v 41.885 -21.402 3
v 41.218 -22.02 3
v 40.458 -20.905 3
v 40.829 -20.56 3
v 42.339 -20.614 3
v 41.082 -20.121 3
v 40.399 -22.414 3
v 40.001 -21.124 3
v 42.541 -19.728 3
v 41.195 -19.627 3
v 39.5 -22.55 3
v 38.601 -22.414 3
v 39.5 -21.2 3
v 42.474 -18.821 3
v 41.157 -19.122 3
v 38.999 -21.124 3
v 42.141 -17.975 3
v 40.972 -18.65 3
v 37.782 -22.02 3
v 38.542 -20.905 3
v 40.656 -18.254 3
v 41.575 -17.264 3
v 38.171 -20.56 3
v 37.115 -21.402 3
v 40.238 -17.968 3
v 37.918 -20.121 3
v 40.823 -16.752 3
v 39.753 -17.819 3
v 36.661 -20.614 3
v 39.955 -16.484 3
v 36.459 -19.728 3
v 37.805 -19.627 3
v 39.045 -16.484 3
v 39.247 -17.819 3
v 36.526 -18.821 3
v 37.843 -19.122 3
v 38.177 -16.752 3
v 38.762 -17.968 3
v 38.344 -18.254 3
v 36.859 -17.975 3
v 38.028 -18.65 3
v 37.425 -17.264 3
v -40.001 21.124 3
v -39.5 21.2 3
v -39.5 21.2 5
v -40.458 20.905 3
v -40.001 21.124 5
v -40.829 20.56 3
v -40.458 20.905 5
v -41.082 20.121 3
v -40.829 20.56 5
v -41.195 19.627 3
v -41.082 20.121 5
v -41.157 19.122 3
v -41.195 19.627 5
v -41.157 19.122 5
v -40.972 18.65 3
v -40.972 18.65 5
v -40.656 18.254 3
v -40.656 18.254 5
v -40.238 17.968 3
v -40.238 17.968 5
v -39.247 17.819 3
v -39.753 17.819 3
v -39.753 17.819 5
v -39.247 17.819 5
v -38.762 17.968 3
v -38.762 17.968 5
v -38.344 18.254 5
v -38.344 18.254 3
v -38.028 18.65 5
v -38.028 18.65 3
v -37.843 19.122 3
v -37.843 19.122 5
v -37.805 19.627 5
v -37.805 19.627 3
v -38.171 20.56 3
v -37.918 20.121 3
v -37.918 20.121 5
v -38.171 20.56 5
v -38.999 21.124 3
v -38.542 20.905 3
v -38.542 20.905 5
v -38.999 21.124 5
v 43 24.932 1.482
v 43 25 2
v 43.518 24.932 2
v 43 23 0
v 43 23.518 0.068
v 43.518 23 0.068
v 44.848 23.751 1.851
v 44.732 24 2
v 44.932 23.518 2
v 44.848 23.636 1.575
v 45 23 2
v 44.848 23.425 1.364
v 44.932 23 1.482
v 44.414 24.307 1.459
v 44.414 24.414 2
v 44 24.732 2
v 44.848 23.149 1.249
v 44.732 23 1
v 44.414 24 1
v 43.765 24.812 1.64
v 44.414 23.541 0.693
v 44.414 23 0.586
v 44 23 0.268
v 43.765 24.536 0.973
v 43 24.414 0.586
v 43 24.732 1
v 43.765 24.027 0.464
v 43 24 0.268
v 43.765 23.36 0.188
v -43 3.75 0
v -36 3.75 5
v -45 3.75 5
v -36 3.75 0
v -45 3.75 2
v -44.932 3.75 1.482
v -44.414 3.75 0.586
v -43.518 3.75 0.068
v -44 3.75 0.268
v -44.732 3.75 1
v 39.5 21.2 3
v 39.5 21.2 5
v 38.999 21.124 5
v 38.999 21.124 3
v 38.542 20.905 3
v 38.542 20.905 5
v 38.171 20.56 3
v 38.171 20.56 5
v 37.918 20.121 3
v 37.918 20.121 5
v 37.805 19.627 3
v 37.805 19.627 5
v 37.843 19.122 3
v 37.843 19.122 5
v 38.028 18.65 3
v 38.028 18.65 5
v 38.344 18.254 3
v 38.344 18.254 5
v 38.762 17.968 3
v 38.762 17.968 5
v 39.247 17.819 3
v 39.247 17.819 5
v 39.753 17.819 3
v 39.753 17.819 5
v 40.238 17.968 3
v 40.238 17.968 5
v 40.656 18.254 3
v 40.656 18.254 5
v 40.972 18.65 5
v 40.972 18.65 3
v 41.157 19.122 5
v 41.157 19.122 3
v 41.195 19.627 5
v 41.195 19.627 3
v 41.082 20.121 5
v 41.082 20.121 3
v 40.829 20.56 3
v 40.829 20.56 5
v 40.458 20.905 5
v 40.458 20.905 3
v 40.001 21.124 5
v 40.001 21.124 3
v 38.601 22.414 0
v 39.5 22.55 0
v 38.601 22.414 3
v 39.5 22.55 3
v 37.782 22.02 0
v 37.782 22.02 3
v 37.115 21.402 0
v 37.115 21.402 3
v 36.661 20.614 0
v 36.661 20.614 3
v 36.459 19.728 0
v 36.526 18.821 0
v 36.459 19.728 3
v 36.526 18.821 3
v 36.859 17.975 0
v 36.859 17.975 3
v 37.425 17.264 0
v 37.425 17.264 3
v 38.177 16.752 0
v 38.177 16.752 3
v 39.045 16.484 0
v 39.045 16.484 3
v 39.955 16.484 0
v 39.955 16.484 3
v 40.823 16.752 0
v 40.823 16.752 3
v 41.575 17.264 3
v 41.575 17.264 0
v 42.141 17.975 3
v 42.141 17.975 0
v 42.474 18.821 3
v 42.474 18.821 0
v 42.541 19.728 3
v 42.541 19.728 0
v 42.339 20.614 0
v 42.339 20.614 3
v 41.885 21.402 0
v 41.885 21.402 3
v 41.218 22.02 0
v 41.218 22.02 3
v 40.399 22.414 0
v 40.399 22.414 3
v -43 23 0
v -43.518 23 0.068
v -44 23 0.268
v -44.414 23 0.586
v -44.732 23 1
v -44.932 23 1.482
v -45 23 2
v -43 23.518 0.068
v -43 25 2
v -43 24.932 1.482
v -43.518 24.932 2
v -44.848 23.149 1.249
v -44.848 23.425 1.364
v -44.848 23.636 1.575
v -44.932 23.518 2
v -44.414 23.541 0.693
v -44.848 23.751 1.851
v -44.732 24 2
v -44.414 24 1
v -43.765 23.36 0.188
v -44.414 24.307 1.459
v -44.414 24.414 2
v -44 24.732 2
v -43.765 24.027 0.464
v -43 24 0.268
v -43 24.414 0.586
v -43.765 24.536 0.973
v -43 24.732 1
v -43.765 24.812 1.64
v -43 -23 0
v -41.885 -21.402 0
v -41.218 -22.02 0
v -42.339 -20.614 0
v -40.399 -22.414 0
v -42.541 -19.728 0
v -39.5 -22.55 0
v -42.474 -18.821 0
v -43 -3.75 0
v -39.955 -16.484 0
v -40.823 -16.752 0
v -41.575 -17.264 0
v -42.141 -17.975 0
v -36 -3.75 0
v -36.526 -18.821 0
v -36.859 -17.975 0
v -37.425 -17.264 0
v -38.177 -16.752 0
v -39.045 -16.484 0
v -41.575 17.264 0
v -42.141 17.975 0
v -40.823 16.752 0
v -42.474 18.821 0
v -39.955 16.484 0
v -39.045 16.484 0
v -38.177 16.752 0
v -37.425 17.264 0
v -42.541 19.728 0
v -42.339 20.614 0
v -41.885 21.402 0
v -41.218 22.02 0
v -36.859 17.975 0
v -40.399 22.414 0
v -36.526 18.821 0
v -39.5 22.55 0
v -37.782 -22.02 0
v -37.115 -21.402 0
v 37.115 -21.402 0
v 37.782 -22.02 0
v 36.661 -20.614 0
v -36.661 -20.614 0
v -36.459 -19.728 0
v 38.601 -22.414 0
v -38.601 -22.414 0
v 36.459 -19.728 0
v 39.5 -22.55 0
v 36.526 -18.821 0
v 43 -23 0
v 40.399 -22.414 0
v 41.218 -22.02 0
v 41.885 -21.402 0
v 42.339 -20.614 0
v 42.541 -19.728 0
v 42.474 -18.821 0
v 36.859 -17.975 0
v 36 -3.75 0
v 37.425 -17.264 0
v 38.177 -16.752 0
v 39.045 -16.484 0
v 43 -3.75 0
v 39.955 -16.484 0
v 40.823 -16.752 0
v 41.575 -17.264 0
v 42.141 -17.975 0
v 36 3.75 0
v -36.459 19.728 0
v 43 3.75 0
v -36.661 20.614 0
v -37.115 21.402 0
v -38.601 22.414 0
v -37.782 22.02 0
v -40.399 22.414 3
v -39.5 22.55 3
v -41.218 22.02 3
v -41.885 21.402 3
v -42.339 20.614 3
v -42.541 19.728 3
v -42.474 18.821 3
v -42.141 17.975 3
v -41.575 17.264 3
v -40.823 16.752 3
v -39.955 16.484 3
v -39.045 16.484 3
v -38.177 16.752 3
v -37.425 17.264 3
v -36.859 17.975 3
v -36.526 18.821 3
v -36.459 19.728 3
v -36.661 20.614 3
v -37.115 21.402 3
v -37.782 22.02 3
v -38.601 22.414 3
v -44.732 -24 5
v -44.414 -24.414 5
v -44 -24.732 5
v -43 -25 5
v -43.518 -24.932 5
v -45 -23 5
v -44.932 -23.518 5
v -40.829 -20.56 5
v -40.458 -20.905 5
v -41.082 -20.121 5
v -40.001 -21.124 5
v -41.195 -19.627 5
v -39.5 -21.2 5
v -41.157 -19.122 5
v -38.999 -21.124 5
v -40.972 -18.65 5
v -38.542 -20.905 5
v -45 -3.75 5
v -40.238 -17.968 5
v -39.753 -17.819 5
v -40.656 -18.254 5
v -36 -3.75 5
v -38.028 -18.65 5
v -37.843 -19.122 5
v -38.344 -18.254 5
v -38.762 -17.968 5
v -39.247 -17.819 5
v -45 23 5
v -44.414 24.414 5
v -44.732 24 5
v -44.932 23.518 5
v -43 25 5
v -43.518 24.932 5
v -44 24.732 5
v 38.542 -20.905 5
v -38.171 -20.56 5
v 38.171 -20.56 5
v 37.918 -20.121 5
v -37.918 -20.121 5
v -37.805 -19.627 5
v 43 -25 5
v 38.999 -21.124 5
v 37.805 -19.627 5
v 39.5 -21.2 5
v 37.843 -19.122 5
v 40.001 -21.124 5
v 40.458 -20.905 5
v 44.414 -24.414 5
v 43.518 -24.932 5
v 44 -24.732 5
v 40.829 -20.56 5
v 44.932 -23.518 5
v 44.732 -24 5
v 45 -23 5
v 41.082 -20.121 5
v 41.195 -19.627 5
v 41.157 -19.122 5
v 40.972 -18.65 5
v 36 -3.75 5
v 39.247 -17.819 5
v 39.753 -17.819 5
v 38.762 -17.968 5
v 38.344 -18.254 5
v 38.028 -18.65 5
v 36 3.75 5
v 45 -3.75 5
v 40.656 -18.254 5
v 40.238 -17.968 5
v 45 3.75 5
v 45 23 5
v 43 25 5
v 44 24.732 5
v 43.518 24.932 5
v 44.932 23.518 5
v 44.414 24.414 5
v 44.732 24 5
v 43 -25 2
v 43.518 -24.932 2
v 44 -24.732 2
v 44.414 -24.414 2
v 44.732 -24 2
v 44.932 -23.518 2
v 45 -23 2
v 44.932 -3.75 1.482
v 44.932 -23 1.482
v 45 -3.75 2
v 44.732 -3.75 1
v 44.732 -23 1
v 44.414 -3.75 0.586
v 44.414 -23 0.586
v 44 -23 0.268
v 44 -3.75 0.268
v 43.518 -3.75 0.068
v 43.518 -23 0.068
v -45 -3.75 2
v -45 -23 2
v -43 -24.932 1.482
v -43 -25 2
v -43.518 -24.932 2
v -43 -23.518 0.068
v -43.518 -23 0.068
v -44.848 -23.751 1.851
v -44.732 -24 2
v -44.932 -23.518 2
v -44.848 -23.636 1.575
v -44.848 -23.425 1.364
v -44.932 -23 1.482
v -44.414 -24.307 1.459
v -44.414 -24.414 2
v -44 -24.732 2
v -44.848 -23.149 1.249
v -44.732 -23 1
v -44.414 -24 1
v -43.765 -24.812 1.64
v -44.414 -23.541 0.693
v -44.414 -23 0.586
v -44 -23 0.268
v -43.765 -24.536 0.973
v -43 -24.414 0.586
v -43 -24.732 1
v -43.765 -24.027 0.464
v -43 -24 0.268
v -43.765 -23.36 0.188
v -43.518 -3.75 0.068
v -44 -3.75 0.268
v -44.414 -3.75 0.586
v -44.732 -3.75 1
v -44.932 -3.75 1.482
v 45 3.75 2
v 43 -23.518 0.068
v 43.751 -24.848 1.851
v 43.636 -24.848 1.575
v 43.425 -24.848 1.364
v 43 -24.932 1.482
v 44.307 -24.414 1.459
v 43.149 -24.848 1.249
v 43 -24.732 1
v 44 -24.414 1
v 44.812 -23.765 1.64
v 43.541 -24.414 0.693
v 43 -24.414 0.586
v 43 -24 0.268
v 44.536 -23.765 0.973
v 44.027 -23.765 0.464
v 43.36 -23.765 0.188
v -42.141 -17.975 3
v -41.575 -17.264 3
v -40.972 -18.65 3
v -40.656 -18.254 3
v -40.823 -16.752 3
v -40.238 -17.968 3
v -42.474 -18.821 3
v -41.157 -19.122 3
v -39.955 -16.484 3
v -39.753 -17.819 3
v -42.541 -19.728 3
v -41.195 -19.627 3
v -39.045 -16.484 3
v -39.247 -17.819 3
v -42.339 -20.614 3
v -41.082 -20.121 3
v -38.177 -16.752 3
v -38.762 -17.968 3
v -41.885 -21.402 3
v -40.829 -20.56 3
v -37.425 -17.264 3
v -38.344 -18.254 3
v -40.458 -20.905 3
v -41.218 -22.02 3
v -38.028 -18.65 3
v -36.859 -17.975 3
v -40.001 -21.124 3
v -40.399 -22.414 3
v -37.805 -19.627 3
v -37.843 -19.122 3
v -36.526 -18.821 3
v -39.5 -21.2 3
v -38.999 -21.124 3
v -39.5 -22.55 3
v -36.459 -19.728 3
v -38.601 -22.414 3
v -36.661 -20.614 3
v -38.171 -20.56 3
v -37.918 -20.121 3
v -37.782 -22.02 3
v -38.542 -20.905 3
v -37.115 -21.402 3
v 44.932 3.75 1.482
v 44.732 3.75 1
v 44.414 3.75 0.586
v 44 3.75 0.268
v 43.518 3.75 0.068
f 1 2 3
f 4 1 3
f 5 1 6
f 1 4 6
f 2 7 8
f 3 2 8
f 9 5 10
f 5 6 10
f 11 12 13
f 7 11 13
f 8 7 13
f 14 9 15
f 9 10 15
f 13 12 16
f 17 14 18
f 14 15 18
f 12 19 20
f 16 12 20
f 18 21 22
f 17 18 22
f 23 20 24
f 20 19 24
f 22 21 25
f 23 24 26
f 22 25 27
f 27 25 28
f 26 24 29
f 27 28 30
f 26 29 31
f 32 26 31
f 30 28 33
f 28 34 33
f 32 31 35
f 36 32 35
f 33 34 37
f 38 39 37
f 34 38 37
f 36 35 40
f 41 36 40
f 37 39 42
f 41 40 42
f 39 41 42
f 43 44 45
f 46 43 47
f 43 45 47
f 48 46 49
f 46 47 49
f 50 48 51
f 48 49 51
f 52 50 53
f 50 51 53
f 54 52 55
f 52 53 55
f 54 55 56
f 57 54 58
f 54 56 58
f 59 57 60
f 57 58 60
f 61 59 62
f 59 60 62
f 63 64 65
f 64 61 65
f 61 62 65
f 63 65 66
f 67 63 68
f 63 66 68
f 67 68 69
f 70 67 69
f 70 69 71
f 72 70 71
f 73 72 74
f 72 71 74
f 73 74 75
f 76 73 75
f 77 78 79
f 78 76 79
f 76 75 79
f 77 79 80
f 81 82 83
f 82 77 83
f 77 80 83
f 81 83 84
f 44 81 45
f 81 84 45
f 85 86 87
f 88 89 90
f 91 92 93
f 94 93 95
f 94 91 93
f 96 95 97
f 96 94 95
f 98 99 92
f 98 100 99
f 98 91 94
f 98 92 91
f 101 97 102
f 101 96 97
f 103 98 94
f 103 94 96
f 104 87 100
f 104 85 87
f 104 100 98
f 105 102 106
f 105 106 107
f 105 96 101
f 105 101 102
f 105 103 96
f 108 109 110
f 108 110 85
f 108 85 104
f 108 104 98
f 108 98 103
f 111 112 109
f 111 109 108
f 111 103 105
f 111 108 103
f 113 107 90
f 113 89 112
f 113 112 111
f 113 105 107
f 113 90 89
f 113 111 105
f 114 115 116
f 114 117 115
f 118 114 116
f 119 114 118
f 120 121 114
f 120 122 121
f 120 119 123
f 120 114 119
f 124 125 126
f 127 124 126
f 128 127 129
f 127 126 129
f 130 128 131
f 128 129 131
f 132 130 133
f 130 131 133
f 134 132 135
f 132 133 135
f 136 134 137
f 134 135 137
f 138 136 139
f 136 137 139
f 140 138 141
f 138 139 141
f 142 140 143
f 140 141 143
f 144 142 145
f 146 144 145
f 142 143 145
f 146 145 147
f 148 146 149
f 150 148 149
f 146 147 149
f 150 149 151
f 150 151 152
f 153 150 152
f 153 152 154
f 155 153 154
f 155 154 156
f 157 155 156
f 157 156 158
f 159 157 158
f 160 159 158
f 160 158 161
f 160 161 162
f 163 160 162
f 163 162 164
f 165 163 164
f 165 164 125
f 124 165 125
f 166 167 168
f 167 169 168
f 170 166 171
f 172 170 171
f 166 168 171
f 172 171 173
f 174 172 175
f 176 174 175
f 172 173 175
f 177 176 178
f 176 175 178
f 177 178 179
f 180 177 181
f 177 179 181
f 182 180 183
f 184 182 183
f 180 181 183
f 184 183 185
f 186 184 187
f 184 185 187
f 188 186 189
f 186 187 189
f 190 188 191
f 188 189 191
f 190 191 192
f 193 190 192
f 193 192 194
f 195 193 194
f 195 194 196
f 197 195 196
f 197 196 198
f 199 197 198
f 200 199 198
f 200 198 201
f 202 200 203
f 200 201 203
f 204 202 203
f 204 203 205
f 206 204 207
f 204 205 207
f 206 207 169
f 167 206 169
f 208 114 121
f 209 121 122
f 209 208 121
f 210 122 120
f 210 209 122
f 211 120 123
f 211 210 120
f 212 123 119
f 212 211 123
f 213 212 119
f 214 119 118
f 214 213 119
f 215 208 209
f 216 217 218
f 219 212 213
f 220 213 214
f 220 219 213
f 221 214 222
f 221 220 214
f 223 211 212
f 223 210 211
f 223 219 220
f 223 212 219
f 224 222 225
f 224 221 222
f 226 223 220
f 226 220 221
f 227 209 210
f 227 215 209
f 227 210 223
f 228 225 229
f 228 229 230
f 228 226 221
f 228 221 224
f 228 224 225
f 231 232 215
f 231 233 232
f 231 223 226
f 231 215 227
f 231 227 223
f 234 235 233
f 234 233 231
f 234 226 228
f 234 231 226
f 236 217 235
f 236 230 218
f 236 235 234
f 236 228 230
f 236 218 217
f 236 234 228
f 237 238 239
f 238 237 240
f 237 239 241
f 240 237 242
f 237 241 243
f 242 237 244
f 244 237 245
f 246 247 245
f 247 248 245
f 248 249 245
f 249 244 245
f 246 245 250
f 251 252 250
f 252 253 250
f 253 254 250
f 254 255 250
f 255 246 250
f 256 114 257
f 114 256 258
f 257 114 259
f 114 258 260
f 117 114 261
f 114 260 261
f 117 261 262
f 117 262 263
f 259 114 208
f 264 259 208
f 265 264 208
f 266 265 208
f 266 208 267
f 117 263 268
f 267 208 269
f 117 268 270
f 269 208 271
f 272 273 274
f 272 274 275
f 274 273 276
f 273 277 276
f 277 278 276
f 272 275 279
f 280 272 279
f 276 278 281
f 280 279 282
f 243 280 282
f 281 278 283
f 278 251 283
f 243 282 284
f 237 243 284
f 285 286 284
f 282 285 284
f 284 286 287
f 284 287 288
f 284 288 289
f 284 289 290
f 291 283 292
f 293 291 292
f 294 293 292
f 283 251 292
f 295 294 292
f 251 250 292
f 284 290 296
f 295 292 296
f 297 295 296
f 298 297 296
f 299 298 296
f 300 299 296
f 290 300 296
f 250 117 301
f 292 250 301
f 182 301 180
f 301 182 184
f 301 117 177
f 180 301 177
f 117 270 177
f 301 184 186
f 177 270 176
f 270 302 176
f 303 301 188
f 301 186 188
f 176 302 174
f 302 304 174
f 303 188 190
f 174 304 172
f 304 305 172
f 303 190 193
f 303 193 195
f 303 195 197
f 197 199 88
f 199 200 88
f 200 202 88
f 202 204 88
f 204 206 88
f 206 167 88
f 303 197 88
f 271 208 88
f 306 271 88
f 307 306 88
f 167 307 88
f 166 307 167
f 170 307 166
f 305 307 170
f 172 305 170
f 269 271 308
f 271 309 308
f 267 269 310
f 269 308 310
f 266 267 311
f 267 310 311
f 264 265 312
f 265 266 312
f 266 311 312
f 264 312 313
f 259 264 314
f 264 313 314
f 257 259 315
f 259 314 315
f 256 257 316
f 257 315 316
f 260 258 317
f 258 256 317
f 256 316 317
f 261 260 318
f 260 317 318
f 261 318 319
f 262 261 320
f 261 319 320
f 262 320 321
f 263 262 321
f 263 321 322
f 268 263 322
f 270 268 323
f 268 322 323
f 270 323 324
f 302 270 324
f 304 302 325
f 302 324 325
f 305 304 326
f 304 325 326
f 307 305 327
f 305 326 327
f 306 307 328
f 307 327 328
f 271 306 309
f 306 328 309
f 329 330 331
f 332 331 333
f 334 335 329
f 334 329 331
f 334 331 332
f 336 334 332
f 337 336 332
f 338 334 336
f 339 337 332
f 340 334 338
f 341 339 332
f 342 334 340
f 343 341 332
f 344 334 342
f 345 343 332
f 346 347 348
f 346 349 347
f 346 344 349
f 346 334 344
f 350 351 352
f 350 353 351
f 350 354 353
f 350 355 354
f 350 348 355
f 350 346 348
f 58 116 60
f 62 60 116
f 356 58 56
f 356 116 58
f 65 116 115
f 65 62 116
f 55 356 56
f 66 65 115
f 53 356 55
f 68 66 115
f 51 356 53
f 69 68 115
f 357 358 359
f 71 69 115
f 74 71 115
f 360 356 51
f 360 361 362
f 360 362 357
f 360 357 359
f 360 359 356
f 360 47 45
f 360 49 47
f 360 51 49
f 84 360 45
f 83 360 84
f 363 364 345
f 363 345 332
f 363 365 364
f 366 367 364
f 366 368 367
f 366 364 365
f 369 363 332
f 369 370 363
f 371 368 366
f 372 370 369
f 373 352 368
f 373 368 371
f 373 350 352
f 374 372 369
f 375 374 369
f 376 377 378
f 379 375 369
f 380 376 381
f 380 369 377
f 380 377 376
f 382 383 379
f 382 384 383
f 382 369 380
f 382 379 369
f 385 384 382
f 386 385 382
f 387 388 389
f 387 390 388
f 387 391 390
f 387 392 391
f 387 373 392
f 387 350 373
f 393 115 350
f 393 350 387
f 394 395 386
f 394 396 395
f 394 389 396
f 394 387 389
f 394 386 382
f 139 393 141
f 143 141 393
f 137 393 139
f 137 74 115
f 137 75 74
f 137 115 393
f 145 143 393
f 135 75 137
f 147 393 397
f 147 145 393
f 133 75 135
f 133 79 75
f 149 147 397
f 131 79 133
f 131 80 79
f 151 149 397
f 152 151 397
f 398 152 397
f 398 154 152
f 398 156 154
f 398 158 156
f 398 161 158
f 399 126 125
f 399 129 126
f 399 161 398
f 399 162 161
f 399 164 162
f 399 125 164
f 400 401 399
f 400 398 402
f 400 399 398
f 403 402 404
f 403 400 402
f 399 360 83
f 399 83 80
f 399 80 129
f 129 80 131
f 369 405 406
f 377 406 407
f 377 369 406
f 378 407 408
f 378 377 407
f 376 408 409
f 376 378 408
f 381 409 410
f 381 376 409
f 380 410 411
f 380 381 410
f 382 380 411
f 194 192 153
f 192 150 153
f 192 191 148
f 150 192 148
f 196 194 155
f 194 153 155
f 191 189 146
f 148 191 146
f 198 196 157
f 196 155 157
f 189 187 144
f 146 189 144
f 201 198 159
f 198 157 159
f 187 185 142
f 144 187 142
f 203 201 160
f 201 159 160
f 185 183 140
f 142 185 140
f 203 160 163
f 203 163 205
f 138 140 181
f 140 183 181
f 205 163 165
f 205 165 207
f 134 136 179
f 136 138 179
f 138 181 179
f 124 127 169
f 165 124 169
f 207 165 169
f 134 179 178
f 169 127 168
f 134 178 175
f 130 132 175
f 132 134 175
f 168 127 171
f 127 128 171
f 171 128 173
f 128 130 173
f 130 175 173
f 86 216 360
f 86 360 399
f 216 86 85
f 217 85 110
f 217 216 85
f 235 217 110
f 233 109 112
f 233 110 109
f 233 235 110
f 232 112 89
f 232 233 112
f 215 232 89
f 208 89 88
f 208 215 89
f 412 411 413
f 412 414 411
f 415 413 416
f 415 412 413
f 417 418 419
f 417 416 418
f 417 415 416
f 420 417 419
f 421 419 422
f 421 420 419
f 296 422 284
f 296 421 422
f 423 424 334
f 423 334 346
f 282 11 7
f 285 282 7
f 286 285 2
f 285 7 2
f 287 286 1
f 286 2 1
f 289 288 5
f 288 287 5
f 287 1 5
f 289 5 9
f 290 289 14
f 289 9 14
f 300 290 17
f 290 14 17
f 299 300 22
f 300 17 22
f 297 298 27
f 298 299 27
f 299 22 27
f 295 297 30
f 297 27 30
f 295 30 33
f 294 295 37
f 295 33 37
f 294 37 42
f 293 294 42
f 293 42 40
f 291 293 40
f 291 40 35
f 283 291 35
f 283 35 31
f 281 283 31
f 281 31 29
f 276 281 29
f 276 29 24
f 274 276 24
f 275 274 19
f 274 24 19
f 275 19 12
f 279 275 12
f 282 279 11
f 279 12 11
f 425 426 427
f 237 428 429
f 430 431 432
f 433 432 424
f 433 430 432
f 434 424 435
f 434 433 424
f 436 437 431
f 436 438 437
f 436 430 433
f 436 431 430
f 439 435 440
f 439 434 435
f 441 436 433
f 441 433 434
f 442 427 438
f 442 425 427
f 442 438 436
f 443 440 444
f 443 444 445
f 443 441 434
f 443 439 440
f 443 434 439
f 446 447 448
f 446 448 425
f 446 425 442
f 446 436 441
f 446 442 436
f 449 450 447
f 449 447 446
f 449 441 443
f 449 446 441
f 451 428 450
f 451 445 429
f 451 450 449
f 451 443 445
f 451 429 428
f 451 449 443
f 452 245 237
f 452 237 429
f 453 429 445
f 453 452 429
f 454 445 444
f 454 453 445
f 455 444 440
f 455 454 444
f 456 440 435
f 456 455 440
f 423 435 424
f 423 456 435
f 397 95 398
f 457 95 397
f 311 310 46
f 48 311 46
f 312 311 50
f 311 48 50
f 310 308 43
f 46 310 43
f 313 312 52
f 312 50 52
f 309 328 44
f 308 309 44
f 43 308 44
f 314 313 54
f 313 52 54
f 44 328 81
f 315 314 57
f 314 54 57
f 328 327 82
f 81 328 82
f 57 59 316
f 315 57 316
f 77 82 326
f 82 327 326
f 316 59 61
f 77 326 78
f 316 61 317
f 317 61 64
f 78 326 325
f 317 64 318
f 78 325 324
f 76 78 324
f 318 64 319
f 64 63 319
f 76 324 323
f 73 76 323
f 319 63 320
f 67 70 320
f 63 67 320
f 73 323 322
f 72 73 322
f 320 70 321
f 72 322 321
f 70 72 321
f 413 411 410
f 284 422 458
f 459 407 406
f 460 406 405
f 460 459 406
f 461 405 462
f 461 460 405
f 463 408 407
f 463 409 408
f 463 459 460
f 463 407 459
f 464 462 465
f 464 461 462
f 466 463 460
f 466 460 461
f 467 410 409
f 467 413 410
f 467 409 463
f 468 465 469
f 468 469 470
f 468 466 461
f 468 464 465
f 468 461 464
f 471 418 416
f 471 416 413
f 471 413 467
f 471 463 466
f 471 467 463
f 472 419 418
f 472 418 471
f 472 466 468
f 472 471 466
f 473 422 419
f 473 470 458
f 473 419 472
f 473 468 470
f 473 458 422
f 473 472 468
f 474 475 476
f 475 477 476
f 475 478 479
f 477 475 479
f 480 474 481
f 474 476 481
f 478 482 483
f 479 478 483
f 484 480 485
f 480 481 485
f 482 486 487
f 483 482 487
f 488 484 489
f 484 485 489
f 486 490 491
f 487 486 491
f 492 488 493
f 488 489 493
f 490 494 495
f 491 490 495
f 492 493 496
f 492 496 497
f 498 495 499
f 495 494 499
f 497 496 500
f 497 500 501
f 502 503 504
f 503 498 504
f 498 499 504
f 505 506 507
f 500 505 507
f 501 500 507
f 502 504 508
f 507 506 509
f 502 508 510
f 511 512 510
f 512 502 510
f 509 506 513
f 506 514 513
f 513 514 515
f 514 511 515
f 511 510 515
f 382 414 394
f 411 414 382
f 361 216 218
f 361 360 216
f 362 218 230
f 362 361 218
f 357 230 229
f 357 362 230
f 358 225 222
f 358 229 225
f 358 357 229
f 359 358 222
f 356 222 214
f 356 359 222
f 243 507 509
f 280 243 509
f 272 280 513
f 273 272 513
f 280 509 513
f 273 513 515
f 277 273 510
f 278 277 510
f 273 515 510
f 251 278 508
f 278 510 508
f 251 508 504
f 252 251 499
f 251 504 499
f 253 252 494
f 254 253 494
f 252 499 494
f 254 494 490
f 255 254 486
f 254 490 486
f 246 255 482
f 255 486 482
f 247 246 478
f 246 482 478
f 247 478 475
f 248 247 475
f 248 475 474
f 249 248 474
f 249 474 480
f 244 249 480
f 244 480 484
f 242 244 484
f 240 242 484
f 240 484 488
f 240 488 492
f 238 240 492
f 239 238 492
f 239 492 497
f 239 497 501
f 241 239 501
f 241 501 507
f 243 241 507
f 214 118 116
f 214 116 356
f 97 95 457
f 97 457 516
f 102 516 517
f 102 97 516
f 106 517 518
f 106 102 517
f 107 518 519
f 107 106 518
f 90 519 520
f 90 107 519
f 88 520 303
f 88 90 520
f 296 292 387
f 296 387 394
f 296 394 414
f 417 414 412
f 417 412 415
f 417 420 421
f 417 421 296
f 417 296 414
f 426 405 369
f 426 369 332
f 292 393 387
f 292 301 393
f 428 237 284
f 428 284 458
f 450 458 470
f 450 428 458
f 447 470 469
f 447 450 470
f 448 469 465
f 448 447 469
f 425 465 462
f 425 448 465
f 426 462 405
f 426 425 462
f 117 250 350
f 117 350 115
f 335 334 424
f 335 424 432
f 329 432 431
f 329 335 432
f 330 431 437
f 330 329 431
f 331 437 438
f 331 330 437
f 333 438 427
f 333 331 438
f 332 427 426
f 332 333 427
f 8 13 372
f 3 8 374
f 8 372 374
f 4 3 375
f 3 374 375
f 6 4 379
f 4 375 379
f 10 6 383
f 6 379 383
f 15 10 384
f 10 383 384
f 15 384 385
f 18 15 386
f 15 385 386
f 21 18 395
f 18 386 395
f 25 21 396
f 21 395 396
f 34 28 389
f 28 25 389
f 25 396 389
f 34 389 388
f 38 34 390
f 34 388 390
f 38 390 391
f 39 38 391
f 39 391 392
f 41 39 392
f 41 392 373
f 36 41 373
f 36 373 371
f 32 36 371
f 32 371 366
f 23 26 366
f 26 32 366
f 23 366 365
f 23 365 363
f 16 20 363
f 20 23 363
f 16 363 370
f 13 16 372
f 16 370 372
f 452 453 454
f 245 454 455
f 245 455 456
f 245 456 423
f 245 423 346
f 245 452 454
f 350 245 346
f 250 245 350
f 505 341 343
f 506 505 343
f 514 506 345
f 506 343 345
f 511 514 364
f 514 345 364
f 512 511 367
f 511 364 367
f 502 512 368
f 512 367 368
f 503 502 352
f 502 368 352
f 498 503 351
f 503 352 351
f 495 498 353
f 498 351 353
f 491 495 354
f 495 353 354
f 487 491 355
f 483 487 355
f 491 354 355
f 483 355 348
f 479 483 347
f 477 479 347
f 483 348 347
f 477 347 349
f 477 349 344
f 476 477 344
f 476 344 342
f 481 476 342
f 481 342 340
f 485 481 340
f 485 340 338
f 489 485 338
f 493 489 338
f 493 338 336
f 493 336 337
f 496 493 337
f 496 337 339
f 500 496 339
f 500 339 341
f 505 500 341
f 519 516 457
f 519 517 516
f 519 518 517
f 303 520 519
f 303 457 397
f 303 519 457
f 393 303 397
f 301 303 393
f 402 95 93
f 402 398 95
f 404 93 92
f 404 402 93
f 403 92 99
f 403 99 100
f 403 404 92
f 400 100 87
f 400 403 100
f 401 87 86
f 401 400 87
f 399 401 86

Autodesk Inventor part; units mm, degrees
ref_plane "YZ Plane" through (0, 0, 0) normal (1, 0, 0) x (0, 1, 0)
ref_plane "XZ Plane" through (0, 0, 0) normal (0, 1, 0) x (-1, 0, 0)
ref_plane "XY Plane" through (0, 0, 0) normal (0, 0, 1) x (1, 0, 0)
sketch "Náčrt1" plane through (0, 0, 0) normal (0, 0, 1) x (1, 0, 0)
  line L0 (0, 35) -> (0, -35) projected
  line L1 (-63, 0) -> (63, 0) projected
  line L2 (-45, 25) -> (45, 25)
  line L3 (45, 25) -> (45, -25)
  line L4 (45, -25) -> (-45, -25)
  line L5 (-45, -25) -> (-45, 25)
  point P0 (0, 0)
  dimension "d0" = 90
  dimension "d1" = 50
extrude "Vysunutí1" add sketch "Náčrt1" along normal blind 5
sketch "Náčrt4" plane through (0, 0, 0) normal (0, 0, -1) x (-1, 0, 0)
  line L0 (45, 25) -> (45, -25) projected
  line L1 (-45, 25) -> (45, 25) projected
  line L2 (-45, -25) -> (-45, 25) projected
  line L3 (45, -25) -> (-45, -25) projected
  line L4 (0, -35) -> (0, 35) projected
  line L5 (-63, 0) -> (63, 0) projected
  point P0 (0, 0)
  point P1 (-39.5, 19.5)
  dimension "d13" = 5.5
  dimension "d14" = 5.5
hole "Díra1" at (39.5, 19.5, 0) direction (0, 0, 1) diameter 3.4 end through all counterbore diameter 6.1 counterbore depth 3 clearance for "Strojní šroub se zápustnou hlavou" size "M3" standard "Ansi M metrický profil"
mirror "Zrcadlit2" about plane through (0, 0, 0) normal (0, 1, 0) of "Díra1"
mirror "Zrcadlit3" about plane through (0, 0, 0) normal (1, 0, 0) of "Díra1", "Zrcadlit2"
fillet "Zaoblení2" radius 2 8 edges at (0, 25, 0) (45, 0, 0) (45, 25, 2.5) (0, -25, 0) (45, -25, 2.5) (-45, 0, 0) (-45, -25, 2.5) (-45, 25, 2.5)
sketch "Náčrt6" plane through (0, 0, 0) normal (0, 0, -1) x (-1, 0, 0)
  circle A0 centre (-39.5, 19.5) radius 3.05 projected
  circle A1 centre (-39.5, -19.5) radius 3.05 projected
  circle A2 centre (39.5, 19.5) radius 3.05 projected
  circle A3 centre (39.5, -19.5) radius 3.05 projected
  line L0 (43, -23) -> (-43, -23) projected
  line L1 (43, 23) -> (43, -23) projected
  line L2 (-43, 23) -> (43, 23) projected
  line L3 (-43, -23) -> (-43, 23) projected
  line L4 (-43, 23) -> (-45, 23) projected
  line L5 (-45, 23) -> (-45, -23) projected
  line L6 (-45, -23) -> (-43, -23) projected
  line L7 (-43, -23) -> (-43, 23) projected
  line L8 (-45, 3.75) -> (-36, 3.75)
  line L9 (-36, 3.75) -> (-36, -3.75)
  line L10 (-36, -3.75) -> (-45, -3.75)
  line L11 (-45, -3.75) -> (-45, 3.75)
  line L12 (-63, 0) -> (63, 0) projected
  point P0 (0, 0)
  dimension "d23" = 9
  dimension "d24" = 7.5
extrude "Vysunutí4" cut sketch "Náčrt6" against normal through all contours L10 L5 L12 L3 | L3 L12 L9 L10 | L12 L3 L8 L9 | L12 L5 L8 L3
mirror "Zrcadlit4" about plane through (0, 0, 0) normal (1, 0, 0) of "Vysunutí4"
properties part number "tcs3200_gate_lid_3D tisk"
